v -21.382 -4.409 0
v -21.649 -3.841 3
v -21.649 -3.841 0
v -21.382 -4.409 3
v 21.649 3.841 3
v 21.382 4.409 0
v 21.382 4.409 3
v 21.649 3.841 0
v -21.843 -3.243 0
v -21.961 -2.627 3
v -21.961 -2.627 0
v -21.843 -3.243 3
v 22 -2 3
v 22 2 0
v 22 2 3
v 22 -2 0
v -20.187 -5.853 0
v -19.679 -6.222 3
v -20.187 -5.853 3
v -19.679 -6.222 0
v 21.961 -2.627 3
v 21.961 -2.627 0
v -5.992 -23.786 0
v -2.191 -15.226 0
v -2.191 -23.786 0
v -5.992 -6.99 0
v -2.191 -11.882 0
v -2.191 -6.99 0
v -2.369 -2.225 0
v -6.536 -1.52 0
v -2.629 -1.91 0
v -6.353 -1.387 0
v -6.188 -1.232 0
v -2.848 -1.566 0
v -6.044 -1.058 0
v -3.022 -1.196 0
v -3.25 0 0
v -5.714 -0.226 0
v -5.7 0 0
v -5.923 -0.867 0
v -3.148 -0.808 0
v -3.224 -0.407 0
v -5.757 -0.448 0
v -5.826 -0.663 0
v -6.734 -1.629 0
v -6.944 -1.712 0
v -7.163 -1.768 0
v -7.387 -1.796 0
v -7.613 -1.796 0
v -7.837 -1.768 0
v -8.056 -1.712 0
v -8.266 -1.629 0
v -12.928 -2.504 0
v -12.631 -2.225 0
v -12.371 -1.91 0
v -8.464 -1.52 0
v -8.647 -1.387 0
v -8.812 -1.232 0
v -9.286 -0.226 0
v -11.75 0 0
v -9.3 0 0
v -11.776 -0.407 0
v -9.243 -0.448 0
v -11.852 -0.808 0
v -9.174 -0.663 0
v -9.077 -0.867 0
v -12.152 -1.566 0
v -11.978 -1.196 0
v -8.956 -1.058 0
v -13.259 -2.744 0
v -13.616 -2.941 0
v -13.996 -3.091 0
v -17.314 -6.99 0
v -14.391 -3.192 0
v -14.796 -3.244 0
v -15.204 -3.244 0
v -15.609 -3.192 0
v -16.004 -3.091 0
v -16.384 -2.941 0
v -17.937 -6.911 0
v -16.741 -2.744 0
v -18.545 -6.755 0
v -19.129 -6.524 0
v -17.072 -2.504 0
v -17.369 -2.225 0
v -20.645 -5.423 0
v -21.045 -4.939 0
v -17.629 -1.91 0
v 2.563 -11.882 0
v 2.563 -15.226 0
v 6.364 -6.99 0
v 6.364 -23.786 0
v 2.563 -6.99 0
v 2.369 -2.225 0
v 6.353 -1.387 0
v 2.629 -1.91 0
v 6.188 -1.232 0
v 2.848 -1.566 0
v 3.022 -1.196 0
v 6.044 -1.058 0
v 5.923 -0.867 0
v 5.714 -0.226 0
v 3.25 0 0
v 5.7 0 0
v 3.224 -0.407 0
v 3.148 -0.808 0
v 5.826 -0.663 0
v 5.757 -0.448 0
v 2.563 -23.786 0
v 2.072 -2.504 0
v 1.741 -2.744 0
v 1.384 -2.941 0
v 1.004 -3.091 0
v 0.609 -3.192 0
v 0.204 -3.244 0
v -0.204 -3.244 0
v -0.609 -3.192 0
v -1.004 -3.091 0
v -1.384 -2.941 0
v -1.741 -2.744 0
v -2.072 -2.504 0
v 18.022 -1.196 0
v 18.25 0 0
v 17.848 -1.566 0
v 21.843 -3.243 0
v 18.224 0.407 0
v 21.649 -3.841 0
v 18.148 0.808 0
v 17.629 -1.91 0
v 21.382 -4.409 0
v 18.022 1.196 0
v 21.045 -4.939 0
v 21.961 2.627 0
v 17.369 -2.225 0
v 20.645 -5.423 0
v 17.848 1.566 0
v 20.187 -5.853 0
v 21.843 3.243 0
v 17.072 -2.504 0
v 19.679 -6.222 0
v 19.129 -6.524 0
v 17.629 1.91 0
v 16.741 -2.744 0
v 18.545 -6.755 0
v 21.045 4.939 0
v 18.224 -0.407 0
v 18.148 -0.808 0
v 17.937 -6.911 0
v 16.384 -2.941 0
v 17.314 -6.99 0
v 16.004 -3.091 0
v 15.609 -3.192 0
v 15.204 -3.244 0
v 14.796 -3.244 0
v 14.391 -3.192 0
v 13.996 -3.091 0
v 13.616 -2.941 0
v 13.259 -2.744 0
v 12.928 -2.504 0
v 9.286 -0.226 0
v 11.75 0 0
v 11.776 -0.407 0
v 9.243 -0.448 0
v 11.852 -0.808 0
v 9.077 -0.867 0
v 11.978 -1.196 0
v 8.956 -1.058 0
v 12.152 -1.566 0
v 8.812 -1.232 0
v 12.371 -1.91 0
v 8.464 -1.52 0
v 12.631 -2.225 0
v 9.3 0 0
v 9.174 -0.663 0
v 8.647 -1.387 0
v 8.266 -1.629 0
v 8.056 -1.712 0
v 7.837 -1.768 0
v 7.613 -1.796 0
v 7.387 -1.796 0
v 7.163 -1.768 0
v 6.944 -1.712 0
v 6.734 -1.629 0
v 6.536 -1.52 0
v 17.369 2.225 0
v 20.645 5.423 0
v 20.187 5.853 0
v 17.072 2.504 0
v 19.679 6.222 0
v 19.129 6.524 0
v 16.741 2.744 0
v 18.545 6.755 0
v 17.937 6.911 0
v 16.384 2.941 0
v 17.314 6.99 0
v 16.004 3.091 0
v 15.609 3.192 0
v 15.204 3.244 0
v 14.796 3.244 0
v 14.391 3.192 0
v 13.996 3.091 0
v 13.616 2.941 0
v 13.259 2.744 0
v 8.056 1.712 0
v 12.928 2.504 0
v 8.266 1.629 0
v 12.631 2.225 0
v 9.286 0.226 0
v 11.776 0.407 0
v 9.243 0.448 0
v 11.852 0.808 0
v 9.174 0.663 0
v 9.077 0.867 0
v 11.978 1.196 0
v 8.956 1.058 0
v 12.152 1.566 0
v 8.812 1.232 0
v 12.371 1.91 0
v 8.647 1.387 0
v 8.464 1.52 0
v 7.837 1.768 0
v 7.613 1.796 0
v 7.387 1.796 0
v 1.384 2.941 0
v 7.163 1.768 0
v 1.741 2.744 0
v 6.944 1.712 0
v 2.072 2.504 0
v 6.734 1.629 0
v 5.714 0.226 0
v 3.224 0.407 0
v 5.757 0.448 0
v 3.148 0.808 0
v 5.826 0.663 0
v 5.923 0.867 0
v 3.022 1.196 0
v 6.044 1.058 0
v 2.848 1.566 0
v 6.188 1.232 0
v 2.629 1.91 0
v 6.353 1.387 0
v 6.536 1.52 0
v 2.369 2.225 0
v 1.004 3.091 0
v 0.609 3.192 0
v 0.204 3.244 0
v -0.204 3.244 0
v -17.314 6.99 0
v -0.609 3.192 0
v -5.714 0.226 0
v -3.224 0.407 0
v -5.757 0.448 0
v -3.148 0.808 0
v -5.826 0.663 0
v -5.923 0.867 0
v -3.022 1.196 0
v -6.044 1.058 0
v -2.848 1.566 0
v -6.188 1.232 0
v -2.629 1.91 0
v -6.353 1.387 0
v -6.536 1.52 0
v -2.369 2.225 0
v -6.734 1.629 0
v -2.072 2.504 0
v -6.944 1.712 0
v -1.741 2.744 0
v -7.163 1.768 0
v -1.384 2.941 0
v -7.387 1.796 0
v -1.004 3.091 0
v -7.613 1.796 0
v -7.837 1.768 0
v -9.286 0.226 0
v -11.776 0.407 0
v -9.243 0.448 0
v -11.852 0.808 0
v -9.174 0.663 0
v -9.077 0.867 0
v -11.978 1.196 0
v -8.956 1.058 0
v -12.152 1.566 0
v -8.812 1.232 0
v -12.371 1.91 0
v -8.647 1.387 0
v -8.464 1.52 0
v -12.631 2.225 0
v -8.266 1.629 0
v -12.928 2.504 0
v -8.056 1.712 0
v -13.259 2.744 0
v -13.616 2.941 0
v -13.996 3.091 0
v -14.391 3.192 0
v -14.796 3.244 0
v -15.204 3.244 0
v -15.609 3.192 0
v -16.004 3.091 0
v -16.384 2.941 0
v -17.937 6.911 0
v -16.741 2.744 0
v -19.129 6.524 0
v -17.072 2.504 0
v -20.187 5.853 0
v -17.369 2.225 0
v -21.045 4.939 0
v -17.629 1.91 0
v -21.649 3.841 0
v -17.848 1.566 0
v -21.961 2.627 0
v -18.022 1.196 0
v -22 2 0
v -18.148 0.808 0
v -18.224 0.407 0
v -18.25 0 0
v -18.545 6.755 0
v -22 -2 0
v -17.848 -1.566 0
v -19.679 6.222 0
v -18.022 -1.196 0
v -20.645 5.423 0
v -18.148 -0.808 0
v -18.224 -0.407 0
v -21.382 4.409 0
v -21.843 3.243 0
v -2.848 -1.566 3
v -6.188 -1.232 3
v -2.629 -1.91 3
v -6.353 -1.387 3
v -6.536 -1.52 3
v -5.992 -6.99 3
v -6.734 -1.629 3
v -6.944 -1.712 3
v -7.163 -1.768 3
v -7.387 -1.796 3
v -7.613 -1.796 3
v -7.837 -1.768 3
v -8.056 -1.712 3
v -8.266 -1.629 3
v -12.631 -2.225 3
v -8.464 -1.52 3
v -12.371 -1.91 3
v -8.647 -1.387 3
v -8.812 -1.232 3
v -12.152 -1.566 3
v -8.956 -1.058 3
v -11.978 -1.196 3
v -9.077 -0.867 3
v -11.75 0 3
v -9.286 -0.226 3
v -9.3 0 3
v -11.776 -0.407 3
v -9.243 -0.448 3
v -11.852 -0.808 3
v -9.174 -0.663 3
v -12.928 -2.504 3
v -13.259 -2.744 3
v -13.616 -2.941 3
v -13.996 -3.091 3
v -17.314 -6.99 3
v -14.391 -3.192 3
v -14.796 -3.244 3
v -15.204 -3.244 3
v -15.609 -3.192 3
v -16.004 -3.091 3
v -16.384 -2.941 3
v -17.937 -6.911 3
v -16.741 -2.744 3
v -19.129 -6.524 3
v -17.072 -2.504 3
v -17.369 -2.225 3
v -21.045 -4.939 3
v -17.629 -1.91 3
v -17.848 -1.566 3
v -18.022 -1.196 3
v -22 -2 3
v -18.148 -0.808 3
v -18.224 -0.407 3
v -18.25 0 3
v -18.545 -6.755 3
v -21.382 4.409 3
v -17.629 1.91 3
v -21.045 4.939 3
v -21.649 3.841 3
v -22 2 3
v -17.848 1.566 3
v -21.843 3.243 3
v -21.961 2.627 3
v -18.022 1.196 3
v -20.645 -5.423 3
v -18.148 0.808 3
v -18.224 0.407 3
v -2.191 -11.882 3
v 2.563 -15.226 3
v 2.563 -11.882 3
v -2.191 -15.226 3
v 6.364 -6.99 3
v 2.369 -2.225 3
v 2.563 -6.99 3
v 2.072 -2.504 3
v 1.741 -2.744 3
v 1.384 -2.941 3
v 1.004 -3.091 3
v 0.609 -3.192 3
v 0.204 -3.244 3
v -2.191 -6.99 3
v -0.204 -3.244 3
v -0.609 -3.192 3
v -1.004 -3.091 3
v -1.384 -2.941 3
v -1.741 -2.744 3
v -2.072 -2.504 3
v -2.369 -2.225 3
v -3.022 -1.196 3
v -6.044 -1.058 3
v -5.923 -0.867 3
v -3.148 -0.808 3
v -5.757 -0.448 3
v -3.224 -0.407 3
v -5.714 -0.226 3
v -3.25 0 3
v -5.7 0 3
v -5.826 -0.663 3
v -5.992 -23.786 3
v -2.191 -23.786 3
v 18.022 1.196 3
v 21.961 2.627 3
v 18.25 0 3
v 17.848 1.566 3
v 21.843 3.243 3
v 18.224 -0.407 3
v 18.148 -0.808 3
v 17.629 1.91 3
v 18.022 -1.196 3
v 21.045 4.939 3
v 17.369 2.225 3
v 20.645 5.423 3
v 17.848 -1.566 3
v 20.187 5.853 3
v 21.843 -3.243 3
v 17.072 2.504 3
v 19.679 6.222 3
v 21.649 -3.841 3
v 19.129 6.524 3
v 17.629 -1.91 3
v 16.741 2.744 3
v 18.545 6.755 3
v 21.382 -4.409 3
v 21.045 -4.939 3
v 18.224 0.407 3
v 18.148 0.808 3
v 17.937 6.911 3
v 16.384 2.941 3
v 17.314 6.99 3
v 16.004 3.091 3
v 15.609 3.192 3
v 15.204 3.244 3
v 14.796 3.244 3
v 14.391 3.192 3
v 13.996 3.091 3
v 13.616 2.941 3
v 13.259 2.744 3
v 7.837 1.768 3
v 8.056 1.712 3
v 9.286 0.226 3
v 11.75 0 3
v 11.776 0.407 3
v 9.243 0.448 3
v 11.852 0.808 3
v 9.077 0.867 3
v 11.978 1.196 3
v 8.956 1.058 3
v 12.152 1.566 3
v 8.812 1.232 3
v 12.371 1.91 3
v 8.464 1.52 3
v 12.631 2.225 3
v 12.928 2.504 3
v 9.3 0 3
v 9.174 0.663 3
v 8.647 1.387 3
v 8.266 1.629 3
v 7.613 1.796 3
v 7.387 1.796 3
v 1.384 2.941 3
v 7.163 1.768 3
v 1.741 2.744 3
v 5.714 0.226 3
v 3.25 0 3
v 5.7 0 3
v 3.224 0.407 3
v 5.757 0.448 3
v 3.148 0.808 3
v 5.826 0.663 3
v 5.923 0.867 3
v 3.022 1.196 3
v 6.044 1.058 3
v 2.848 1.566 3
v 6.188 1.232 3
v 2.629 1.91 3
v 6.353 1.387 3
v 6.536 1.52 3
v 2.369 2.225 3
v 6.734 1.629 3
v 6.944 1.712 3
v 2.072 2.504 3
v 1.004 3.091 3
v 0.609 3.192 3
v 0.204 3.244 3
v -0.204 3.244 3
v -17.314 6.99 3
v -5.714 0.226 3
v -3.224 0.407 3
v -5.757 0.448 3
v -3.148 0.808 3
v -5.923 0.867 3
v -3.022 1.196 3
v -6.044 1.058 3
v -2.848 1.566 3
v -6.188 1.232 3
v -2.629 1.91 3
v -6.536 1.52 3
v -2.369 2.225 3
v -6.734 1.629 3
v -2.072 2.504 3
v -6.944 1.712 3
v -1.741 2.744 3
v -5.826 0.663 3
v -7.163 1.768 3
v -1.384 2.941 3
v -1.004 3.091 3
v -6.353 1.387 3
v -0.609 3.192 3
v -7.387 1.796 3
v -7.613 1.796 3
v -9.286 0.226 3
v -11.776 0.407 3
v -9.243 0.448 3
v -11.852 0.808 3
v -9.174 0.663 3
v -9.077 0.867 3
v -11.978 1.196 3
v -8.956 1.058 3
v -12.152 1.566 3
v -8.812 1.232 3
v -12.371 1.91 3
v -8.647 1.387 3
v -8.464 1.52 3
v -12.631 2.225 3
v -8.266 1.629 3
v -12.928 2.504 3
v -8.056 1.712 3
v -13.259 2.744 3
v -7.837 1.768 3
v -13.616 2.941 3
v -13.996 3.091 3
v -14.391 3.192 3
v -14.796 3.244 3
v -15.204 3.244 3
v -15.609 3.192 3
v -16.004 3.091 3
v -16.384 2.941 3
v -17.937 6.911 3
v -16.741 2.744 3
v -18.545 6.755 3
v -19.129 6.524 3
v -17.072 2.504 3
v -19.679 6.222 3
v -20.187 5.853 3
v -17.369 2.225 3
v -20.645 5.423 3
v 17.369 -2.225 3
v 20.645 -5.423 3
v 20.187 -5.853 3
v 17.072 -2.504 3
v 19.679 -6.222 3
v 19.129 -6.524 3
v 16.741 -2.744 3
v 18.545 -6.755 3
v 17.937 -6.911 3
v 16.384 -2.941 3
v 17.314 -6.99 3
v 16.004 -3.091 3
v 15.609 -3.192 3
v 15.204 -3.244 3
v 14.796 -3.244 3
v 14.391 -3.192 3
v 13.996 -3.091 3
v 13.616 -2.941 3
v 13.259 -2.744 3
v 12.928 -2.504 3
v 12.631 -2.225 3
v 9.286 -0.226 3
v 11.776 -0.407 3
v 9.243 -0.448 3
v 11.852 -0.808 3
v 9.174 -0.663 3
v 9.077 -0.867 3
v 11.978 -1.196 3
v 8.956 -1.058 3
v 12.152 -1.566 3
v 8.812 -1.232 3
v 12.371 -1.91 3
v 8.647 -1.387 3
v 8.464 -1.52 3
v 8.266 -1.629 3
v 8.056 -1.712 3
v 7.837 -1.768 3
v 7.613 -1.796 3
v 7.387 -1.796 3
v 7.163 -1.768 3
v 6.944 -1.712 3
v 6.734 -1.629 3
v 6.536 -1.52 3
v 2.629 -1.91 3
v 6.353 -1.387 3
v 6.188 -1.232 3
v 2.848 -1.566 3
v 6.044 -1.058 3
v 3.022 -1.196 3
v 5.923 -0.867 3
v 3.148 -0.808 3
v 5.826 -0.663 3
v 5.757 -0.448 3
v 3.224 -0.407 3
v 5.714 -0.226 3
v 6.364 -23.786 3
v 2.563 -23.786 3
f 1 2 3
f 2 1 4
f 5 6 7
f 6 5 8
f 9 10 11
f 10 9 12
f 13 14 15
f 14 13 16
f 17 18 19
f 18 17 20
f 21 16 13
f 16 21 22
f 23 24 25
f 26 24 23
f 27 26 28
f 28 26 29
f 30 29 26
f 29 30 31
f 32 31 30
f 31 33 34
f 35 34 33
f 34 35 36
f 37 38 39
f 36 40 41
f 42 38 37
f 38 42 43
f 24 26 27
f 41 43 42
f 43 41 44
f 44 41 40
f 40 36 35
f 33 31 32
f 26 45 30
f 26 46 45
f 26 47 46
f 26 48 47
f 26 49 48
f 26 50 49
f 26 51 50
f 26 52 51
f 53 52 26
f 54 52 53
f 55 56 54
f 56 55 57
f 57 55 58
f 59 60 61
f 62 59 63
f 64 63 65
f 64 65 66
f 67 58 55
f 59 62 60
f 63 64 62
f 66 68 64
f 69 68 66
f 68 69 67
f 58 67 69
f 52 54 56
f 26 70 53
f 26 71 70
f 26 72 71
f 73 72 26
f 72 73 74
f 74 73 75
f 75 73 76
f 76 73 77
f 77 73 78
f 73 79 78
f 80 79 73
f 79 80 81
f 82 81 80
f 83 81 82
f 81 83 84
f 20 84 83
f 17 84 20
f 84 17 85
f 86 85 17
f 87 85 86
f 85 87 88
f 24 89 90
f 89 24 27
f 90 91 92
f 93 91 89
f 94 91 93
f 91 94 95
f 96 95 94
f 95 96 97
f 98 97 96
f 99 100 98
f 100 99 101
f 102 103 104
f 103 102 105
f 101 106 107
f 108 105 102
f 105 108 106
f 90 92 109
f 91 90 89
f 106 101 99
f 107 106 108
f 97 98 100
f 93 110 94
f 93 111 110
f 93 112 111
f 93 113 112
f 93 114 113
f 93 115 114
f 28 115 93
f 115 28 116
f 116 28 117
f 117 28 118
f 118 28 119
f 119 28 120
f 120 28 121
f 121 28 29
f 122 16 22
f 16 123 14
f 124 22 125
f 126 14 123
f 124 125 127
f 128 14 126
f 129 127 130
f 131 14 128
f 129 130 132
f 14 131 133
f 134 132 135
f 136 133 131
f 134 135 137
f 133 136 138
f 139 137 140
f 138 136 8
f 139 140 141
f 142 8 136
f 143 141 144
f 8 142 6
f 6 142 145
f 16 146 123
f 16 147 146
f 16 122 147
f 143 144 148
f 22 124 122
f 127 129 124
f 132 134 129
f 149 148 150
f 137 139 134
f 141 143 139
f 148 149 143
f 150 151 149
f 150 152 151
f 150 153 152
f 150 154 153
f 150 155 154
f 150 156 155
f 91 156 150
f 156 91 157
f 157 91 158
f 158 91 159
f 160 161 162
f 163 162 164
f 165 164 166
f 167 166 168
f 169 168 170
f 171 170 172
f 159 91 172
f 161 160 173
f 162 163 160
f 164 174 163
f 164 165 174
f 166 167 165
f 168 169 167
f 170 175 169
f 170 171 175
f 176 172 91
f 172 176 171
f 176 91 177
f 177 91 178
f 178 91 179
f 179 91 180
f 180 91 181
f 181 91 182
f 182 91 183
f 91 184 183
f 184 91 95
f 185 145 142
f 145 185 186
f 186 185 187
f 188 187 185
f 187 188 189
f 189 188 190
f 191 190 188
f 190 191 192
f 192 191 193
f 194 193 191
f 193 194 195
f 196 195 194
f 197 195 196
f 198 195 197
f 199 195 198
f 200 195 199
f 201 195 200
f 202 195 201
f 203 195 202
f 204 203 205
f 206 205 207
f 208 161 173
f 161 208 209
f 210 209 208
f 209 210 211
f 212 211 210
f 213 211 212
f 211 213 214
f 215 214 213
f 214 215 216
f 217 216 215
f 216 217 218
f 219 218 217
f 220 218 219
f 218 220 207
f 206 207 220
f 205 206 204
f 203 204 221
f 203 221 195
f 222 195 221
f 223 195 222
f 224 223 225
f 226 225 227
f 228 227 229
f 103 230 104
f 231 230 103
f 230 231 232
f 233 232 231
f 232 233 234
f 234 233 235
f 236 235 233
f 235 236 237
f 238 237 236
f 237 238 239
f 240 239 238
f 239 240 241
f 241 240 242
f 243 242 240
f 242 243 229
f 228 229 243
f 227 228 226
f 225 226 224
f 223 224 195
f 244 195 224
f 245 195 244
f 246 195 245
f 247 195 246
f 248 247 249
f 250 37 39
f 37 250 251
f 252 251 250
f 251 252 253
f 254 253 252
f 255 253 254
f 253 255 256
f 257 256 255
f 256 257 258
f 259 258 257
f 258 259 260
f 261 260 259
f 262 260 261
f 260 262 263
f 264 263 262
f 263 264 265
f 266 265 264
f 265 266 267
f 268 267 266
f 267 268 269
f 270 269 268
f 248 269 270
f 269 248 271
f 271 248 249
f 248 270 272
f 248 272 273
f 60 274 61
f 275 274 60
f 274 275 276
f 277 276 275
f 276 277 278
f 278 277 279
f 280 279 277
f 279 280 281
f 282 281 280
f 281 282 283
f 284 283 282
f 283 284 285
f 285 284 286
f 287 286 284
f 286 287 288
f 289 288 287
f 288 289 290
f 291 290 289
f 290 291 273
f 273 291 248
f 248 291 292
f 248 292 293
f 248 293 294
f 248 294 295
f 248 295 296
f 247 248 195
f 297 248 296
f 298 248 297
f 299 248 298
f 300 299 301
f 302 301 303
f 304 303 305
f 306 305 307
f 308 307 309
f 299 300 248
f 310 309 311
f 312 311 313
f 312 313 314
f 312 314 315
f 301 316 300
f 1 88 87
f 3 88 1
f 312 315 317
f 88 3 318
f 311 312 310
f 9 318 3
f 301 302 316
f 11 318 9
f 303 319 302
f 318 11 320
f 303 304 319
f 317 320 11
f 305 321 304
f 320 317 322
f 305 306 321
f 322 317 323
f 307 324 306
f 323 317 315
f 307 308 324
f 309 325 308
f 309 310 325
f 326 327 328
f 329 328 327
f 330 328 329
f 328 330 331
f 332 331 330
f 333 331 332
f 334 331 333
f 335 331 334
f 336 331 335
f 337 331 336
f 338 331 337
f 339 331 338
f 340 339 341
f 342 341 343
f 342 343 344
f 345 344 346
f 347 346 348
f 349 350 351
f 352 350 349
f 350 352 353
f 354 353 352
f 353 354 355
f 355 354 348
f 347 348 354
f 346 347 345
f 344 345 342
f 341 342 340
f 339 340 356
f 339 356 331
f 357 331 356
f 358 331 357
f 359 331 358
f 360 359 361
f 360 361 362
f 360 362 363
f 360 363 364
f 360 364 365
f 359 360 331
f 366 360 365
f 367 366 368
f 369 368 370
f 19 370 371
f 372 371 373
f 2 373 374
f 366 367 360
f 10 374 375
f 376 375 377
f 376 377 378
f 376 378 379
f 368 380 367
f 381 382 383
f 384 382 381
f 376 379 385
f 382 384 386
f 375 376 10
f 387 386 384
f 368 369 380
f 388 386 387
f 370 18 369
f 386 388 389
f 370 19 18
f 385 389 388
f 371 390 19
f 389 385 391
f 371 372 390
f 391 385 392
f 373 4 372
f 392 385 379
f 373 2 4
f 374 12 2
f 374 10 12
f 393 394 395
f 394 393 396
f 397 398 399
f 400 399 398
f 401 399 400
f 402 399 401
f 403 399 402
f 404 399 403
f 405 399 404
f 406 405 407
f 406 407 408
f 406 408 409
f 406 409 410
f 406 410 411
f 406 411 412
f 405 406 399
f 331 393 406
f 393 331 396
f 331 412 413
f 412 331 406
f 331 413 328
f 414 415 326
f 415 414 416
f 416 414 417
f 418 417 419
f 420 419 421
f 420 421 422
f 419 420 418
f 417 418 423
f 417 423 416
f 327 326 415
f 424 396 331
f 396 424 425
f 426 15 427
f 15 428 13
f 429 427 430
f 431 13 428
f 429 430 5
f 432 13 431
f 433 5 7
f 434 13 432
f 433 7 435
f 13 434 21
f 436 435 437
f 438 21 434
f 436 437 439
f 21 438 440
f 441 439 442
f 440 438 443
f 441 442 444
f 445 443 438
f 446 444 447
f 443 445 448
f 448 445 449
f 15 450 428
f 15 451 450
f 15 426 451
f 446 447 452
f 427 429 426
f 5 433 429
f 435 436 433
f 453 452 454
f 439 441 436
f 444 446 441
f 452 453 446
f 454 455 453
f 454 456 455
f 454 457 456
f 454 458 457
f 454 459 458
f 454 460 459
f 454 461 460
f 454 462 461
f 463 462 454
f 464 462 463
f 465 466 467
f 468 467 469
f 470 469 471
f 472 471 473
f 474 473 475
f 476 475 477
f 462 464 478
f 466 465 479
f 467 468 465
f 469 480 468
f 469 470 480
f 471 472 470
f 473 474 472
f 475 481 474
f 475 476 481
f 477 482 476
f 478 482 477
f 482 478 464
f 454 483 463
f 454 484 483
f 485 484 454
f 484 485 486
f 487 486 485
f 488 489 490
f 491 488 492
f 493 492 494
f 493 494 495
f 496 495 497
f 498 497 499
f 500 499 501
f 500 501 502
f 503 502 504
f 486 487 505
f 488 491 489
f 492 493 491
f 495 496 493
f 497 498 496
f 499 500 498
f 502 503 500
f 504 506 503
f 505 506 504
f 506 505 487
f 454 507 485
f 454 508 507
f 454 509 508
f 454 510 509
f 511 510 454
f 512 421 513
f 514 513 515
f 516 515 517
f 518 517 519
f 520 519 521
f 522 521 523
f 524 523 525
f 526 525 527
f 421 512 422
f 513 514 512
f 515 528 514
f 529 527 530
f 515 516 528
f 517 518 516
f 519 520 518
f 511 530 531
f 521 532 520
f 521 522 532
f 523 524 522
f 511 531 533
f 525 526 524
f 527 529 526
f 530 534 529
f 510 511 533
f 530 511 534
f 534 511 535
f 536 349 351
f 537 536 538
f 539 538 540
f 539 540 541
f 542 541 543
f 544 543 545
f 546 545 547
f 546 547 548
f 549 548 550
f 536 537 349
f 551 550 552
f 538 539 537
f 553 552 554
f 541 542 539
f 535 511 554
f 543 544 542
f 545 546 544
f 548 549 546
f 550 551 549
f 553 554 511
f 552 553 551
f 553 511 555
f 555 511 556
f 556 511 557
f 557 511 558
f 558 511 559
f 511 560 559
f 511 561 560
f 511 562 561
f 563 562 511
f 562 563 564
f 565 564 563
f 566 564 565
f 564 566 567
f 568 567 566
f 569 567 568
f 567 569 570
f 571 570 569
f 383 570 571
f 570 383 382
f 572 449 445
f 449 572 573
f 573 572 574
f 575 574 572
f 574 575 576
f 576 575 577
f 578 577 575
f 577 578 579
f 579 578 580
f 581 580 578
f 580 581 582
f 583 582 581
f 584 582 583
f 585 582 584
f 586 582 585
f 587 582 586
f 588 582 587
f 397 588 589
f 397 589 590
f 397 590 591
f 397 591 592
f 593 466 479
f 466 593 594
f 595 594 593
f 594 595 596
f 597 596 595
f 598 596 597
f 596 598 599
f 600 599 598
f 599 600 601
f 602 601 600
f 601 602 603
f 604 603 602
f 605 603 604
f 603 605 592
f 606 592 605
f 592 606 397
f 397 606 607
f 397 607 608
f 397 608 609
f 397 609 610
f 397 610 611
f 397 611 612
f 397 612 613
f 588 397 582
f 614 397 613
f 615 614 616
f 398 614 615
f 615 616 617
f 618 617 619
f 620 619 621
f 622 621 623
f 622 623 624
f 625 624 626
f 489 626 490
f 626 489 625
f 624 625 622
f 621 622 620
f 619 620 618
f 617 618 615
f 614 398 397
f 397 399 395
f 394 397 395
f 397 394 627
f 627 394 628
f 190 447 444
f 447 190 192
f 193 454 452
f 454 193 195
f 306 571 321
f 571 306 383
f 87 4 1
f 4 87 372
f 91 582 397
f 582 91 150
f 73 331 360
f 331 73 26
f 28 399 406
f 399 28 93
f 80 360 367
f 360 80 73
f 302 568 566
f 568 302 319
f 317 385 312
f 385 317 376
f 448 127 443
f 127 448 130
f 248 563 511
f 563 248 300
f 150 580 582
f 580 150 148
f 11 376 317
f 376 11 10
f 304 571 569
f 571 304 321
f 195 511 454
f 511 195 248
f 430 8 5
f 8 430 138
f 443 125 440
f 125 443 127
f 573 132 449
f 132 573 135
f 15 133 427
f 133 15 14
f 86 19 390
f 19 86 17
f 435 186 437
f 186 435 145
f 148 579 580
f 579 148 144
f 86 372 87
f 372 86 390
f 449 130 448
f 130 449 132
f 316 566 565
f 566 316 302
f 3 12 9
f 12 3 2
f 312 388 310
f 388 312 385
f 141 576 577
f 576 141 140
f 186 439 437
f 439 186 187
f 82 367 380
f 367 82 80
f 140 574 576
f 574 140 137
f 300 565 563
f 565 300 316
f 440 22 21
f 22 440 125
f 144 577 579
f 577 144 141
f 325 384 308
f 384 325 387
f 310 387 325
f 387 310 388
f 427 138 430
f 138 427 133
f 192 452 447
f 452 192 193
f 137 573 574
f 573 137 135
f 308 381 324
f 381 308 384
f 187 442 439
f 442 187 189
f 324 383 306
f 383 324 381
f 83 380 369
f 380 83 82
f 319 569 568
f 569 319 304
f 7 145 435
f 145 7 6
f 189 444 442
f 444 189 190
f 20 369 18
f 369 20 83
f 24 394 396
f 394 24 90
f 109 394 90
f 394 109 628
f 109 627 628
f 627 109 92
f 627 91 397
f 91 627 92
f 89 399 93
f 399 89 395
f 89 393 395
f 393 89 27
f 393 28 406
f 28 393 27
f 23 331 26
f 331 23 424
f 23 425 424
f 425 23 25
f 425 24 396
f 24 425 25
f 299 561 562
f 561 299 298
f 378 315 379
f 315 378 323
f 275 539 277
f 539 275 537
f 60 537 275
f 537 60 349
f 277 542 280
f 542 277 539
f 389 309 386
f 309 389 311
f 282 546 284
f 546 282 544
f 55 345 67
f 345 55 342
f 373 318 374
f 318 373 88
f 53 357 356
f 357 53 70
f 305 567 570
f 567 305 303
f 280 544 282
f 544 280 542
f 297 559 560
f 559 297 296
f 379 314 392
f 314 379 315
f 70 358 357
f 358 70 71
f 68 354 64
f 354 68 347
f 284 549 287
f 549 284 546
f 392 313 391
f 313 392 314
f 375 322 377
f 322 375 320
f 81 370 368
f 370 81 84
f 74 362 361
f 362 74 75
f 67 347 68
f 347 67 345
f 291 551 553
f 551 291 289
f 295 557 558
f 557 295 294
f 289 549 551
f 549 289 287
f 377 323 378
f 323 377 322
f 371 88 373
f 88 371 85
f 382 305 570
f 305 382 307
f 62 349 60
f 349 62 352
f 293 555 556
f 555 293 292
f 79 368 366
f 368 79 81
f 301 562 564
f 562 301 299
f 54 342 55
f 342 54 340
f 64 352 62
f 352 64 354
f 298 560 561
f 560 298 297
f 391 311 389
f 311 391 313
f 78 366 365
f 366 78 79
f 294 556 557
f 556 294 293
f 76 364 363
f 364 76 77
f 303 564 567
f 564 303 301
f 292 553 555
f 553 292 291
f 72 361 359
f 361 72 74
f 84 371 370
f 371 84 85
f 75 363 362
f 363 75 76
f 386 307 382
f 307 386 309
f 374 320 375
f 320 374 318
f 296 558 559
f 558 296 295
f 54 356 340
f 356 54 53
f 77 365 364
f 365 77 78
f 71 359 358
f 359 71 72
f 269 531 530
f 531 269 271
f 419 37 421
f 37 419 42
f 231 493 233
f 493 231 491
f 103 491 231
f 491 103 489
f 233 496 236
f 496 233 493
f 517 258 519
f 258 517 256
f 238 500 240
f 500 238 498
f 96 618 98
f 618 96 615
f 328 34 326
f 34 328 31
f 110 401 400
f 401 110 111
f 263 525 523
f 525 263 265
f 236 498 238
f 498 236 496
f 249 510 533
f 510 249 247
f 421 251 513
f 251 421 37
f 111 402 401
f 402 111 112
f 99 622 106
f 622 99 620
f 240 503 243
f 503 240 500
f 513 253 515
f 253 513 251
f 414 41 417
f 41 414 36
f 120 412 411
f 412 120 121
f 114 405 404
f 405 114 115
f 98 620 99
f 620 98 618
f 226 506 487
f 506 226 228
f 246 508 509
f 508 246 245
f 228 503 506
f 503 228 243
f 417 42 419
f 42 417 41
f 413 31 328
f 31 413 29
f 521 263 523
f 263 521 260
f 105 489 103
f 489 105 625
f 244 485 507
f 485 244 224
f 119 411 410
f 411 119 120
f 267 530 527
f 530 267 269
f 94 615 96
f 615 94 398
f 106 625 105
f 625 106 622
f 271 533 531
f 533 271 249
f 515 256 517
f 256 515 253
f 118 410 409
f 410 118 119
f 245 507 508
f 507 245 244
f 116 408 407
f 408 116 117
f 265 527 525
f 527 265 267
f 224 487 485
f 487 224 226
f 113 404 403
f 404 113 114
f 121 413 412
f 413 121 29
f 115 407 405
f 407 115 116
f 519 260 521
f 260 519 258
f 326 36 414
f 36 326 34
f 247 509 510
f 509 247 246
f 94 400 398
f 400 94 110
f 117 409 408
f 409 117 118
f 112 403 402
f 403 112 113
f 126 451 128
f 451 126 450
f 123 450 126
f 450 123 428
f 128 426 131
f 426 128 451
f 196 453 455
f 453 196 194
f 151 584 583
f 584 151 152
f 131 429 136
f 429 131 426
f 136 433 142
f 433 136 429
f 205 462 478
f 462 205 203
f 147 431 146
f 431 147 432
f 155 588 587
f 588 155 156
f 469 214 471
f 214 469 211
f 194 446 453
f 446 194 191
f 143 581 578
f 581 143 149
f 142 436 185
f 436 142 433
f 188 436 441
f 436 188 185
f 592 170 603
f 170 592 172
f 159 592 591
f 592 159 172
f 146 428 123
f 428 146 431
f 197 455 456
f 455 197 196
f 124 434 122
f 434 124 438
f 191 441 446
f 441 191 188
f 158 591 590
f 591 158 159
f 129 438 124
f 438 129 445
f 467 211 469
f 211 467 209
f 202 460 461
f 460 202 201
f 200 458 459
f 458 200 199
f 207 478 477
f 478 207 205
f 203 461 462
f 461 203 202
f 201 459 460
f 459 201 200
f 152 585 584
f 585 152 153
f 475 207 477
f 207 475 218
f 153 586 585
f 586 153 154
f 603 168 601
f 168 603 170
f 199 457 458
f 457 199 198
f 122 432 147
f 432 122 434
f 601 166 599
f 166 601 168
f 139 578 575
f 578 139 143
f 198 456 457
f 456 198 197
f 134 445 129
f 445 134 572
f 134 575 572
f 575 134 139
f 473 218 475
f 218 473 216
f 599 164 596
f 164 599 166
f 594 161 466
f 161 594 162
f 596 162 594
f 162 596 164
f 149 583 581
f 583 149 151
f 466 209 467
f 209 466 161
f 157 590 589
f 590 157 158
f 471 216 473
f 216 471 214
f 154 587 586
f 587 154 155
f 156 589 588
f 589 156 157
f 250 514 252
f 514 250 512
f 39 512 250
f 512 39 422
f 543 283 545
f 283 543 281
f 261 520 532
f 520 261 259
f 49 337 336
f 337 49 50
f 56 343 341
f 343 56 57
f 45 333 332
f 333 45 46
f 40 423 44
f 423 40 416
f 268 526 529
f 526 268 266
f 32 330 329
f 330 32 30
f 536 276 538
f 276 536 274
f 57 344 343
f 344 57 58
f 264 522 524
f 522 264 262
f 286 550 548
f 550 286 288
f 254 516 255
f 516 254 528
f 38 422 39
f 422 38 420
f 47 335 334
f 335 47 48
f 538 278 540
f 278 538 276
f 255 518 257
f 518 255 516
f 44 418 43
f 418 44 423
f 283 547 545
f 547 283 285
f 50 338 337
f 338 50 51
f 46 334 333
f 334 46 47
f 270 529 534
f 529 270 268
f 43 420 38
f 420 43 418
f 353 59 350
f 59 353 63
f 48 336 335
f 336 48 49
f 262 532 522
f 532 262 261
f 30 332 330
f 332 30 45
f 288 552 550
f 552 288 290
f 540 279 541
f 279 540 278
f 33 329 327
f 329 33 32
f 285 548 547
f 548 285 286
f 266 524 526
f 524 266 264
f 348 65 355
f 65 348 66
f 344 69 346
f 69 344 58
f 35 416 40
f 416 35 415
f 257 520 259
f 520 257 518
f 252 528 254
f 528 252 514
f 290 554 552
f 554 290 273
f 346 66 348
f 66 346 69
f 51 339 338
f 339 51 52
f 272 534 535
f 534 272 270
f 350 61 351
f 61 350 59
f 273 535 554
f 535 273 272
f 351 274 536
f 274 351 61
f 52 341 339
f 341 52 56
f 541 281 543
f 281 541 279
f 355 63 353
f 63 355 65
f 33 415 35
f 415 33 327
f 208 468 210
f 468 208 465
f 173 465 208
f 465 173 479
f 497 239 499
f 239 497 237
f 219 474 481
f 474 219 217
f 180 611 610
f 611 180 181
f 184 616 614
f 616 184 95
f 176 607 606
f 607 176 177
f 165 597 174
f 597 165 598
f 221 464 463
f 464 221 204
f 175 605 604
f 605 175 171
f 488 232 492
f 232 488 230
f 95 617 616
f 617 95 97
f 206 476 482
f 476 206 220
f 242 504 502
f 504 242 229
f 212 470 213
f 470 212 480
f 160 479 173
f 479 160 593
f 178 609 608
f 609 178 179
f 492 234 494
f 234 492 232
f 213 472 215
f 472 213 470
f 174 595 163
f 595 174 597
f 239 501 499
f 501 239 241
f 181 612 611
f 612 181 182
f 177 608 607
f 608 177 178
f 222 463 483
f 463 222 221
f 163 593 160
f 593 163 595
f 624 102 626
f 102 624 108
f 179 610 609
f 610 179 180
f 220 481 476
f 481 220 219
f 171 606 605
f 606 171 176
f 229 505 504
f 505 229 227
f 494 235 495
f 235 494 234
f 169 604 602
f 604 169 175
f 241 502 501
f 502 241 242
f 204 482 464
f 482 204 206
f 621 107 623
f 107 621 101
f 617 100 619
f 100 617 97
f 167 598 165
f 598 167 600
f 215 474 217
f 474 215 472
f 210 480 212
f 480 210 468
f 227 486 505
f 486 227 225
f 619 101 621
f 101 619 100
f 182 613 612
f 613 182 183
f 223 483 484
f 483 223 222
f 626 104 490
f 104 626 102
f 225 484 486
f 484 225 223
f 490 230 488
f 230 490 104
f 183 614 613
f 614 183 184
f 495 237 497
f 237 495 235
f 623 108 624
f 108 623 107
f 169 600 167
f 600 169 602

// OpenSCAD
$fn = 50;


difference() {
	union() {
		hull() {
			translate(v = [-17.0000000000, 2.0000000000, 0]) {
				cylinder(h = 3, r = 5);
			}
			translate(v = [17.0000000000, 2.0000000000, 0]) {
				cylinder(h = 3, r = 5);
			}
			translate(v = [-17.0000000000, -2.0000000000, 0]) {
				cylinder(h = 3, r = 5);
			}
			translate(v = [17.0000000000, -2.0000000000, 0]) {
				cylinder(h = 3, r = 5);
			}
		}
		translate(v = [0, -5, 0]) {
			linear_extrude(height = 3) {
				text(font = "DejaVu Sans Mono:style=Bold", halign = "center", size = 19.0000000000, text = "H", valign = "top");
			}
		}
	}
	union() {
		translate(v = [-15.0000000000, 0.0000000000, 0]) {
			translate(v = [0, 0, -100]) {
				cylinder(h = 200, r = 3.2500000000);
			}
		}
		translate(v = [0, 0, -100]) {
			cylinder(h = 200, r = 3.2500000000);
		}
		translate(v = [15.0000000000, 0.0000000000, 0]) {
			translate(v = [0, 0, -100]) {
				cylinder(h = 200, r = 3.2500000000);
			}
		}
		translate(v = [-15.0000000000, 0.0000000000, 0]) {
			translate(v = [0, 0, -100]) {
				cylinder(h = 200, r = 1.8000000000);
			}
		}
		translate(v = [-7.5000000000, 0.0000000000, 0]) {
			translate(v = [0, 0, -100]) {
				cylinder(h = 200, r = 1.8000000000);
			}
		}
		translate(v = [0, 0, -100]) {
			cylinder(h = 200, r = 1.8000000000);
		}
		translate(v = [7.5000000000, 0.0000000000, 0]) {
			translate(v = [0, 0, -100]) {
				cylinder(h = 200, r = 1.8000000000);
			}
		}
		translate(v = [15.0000000000, 0.0000000000, 0]) {
			translate(v = [0, 0, -100]) {
				cylinder(h = 200, r = 1.8000000000);
			}
		}
	}
}
